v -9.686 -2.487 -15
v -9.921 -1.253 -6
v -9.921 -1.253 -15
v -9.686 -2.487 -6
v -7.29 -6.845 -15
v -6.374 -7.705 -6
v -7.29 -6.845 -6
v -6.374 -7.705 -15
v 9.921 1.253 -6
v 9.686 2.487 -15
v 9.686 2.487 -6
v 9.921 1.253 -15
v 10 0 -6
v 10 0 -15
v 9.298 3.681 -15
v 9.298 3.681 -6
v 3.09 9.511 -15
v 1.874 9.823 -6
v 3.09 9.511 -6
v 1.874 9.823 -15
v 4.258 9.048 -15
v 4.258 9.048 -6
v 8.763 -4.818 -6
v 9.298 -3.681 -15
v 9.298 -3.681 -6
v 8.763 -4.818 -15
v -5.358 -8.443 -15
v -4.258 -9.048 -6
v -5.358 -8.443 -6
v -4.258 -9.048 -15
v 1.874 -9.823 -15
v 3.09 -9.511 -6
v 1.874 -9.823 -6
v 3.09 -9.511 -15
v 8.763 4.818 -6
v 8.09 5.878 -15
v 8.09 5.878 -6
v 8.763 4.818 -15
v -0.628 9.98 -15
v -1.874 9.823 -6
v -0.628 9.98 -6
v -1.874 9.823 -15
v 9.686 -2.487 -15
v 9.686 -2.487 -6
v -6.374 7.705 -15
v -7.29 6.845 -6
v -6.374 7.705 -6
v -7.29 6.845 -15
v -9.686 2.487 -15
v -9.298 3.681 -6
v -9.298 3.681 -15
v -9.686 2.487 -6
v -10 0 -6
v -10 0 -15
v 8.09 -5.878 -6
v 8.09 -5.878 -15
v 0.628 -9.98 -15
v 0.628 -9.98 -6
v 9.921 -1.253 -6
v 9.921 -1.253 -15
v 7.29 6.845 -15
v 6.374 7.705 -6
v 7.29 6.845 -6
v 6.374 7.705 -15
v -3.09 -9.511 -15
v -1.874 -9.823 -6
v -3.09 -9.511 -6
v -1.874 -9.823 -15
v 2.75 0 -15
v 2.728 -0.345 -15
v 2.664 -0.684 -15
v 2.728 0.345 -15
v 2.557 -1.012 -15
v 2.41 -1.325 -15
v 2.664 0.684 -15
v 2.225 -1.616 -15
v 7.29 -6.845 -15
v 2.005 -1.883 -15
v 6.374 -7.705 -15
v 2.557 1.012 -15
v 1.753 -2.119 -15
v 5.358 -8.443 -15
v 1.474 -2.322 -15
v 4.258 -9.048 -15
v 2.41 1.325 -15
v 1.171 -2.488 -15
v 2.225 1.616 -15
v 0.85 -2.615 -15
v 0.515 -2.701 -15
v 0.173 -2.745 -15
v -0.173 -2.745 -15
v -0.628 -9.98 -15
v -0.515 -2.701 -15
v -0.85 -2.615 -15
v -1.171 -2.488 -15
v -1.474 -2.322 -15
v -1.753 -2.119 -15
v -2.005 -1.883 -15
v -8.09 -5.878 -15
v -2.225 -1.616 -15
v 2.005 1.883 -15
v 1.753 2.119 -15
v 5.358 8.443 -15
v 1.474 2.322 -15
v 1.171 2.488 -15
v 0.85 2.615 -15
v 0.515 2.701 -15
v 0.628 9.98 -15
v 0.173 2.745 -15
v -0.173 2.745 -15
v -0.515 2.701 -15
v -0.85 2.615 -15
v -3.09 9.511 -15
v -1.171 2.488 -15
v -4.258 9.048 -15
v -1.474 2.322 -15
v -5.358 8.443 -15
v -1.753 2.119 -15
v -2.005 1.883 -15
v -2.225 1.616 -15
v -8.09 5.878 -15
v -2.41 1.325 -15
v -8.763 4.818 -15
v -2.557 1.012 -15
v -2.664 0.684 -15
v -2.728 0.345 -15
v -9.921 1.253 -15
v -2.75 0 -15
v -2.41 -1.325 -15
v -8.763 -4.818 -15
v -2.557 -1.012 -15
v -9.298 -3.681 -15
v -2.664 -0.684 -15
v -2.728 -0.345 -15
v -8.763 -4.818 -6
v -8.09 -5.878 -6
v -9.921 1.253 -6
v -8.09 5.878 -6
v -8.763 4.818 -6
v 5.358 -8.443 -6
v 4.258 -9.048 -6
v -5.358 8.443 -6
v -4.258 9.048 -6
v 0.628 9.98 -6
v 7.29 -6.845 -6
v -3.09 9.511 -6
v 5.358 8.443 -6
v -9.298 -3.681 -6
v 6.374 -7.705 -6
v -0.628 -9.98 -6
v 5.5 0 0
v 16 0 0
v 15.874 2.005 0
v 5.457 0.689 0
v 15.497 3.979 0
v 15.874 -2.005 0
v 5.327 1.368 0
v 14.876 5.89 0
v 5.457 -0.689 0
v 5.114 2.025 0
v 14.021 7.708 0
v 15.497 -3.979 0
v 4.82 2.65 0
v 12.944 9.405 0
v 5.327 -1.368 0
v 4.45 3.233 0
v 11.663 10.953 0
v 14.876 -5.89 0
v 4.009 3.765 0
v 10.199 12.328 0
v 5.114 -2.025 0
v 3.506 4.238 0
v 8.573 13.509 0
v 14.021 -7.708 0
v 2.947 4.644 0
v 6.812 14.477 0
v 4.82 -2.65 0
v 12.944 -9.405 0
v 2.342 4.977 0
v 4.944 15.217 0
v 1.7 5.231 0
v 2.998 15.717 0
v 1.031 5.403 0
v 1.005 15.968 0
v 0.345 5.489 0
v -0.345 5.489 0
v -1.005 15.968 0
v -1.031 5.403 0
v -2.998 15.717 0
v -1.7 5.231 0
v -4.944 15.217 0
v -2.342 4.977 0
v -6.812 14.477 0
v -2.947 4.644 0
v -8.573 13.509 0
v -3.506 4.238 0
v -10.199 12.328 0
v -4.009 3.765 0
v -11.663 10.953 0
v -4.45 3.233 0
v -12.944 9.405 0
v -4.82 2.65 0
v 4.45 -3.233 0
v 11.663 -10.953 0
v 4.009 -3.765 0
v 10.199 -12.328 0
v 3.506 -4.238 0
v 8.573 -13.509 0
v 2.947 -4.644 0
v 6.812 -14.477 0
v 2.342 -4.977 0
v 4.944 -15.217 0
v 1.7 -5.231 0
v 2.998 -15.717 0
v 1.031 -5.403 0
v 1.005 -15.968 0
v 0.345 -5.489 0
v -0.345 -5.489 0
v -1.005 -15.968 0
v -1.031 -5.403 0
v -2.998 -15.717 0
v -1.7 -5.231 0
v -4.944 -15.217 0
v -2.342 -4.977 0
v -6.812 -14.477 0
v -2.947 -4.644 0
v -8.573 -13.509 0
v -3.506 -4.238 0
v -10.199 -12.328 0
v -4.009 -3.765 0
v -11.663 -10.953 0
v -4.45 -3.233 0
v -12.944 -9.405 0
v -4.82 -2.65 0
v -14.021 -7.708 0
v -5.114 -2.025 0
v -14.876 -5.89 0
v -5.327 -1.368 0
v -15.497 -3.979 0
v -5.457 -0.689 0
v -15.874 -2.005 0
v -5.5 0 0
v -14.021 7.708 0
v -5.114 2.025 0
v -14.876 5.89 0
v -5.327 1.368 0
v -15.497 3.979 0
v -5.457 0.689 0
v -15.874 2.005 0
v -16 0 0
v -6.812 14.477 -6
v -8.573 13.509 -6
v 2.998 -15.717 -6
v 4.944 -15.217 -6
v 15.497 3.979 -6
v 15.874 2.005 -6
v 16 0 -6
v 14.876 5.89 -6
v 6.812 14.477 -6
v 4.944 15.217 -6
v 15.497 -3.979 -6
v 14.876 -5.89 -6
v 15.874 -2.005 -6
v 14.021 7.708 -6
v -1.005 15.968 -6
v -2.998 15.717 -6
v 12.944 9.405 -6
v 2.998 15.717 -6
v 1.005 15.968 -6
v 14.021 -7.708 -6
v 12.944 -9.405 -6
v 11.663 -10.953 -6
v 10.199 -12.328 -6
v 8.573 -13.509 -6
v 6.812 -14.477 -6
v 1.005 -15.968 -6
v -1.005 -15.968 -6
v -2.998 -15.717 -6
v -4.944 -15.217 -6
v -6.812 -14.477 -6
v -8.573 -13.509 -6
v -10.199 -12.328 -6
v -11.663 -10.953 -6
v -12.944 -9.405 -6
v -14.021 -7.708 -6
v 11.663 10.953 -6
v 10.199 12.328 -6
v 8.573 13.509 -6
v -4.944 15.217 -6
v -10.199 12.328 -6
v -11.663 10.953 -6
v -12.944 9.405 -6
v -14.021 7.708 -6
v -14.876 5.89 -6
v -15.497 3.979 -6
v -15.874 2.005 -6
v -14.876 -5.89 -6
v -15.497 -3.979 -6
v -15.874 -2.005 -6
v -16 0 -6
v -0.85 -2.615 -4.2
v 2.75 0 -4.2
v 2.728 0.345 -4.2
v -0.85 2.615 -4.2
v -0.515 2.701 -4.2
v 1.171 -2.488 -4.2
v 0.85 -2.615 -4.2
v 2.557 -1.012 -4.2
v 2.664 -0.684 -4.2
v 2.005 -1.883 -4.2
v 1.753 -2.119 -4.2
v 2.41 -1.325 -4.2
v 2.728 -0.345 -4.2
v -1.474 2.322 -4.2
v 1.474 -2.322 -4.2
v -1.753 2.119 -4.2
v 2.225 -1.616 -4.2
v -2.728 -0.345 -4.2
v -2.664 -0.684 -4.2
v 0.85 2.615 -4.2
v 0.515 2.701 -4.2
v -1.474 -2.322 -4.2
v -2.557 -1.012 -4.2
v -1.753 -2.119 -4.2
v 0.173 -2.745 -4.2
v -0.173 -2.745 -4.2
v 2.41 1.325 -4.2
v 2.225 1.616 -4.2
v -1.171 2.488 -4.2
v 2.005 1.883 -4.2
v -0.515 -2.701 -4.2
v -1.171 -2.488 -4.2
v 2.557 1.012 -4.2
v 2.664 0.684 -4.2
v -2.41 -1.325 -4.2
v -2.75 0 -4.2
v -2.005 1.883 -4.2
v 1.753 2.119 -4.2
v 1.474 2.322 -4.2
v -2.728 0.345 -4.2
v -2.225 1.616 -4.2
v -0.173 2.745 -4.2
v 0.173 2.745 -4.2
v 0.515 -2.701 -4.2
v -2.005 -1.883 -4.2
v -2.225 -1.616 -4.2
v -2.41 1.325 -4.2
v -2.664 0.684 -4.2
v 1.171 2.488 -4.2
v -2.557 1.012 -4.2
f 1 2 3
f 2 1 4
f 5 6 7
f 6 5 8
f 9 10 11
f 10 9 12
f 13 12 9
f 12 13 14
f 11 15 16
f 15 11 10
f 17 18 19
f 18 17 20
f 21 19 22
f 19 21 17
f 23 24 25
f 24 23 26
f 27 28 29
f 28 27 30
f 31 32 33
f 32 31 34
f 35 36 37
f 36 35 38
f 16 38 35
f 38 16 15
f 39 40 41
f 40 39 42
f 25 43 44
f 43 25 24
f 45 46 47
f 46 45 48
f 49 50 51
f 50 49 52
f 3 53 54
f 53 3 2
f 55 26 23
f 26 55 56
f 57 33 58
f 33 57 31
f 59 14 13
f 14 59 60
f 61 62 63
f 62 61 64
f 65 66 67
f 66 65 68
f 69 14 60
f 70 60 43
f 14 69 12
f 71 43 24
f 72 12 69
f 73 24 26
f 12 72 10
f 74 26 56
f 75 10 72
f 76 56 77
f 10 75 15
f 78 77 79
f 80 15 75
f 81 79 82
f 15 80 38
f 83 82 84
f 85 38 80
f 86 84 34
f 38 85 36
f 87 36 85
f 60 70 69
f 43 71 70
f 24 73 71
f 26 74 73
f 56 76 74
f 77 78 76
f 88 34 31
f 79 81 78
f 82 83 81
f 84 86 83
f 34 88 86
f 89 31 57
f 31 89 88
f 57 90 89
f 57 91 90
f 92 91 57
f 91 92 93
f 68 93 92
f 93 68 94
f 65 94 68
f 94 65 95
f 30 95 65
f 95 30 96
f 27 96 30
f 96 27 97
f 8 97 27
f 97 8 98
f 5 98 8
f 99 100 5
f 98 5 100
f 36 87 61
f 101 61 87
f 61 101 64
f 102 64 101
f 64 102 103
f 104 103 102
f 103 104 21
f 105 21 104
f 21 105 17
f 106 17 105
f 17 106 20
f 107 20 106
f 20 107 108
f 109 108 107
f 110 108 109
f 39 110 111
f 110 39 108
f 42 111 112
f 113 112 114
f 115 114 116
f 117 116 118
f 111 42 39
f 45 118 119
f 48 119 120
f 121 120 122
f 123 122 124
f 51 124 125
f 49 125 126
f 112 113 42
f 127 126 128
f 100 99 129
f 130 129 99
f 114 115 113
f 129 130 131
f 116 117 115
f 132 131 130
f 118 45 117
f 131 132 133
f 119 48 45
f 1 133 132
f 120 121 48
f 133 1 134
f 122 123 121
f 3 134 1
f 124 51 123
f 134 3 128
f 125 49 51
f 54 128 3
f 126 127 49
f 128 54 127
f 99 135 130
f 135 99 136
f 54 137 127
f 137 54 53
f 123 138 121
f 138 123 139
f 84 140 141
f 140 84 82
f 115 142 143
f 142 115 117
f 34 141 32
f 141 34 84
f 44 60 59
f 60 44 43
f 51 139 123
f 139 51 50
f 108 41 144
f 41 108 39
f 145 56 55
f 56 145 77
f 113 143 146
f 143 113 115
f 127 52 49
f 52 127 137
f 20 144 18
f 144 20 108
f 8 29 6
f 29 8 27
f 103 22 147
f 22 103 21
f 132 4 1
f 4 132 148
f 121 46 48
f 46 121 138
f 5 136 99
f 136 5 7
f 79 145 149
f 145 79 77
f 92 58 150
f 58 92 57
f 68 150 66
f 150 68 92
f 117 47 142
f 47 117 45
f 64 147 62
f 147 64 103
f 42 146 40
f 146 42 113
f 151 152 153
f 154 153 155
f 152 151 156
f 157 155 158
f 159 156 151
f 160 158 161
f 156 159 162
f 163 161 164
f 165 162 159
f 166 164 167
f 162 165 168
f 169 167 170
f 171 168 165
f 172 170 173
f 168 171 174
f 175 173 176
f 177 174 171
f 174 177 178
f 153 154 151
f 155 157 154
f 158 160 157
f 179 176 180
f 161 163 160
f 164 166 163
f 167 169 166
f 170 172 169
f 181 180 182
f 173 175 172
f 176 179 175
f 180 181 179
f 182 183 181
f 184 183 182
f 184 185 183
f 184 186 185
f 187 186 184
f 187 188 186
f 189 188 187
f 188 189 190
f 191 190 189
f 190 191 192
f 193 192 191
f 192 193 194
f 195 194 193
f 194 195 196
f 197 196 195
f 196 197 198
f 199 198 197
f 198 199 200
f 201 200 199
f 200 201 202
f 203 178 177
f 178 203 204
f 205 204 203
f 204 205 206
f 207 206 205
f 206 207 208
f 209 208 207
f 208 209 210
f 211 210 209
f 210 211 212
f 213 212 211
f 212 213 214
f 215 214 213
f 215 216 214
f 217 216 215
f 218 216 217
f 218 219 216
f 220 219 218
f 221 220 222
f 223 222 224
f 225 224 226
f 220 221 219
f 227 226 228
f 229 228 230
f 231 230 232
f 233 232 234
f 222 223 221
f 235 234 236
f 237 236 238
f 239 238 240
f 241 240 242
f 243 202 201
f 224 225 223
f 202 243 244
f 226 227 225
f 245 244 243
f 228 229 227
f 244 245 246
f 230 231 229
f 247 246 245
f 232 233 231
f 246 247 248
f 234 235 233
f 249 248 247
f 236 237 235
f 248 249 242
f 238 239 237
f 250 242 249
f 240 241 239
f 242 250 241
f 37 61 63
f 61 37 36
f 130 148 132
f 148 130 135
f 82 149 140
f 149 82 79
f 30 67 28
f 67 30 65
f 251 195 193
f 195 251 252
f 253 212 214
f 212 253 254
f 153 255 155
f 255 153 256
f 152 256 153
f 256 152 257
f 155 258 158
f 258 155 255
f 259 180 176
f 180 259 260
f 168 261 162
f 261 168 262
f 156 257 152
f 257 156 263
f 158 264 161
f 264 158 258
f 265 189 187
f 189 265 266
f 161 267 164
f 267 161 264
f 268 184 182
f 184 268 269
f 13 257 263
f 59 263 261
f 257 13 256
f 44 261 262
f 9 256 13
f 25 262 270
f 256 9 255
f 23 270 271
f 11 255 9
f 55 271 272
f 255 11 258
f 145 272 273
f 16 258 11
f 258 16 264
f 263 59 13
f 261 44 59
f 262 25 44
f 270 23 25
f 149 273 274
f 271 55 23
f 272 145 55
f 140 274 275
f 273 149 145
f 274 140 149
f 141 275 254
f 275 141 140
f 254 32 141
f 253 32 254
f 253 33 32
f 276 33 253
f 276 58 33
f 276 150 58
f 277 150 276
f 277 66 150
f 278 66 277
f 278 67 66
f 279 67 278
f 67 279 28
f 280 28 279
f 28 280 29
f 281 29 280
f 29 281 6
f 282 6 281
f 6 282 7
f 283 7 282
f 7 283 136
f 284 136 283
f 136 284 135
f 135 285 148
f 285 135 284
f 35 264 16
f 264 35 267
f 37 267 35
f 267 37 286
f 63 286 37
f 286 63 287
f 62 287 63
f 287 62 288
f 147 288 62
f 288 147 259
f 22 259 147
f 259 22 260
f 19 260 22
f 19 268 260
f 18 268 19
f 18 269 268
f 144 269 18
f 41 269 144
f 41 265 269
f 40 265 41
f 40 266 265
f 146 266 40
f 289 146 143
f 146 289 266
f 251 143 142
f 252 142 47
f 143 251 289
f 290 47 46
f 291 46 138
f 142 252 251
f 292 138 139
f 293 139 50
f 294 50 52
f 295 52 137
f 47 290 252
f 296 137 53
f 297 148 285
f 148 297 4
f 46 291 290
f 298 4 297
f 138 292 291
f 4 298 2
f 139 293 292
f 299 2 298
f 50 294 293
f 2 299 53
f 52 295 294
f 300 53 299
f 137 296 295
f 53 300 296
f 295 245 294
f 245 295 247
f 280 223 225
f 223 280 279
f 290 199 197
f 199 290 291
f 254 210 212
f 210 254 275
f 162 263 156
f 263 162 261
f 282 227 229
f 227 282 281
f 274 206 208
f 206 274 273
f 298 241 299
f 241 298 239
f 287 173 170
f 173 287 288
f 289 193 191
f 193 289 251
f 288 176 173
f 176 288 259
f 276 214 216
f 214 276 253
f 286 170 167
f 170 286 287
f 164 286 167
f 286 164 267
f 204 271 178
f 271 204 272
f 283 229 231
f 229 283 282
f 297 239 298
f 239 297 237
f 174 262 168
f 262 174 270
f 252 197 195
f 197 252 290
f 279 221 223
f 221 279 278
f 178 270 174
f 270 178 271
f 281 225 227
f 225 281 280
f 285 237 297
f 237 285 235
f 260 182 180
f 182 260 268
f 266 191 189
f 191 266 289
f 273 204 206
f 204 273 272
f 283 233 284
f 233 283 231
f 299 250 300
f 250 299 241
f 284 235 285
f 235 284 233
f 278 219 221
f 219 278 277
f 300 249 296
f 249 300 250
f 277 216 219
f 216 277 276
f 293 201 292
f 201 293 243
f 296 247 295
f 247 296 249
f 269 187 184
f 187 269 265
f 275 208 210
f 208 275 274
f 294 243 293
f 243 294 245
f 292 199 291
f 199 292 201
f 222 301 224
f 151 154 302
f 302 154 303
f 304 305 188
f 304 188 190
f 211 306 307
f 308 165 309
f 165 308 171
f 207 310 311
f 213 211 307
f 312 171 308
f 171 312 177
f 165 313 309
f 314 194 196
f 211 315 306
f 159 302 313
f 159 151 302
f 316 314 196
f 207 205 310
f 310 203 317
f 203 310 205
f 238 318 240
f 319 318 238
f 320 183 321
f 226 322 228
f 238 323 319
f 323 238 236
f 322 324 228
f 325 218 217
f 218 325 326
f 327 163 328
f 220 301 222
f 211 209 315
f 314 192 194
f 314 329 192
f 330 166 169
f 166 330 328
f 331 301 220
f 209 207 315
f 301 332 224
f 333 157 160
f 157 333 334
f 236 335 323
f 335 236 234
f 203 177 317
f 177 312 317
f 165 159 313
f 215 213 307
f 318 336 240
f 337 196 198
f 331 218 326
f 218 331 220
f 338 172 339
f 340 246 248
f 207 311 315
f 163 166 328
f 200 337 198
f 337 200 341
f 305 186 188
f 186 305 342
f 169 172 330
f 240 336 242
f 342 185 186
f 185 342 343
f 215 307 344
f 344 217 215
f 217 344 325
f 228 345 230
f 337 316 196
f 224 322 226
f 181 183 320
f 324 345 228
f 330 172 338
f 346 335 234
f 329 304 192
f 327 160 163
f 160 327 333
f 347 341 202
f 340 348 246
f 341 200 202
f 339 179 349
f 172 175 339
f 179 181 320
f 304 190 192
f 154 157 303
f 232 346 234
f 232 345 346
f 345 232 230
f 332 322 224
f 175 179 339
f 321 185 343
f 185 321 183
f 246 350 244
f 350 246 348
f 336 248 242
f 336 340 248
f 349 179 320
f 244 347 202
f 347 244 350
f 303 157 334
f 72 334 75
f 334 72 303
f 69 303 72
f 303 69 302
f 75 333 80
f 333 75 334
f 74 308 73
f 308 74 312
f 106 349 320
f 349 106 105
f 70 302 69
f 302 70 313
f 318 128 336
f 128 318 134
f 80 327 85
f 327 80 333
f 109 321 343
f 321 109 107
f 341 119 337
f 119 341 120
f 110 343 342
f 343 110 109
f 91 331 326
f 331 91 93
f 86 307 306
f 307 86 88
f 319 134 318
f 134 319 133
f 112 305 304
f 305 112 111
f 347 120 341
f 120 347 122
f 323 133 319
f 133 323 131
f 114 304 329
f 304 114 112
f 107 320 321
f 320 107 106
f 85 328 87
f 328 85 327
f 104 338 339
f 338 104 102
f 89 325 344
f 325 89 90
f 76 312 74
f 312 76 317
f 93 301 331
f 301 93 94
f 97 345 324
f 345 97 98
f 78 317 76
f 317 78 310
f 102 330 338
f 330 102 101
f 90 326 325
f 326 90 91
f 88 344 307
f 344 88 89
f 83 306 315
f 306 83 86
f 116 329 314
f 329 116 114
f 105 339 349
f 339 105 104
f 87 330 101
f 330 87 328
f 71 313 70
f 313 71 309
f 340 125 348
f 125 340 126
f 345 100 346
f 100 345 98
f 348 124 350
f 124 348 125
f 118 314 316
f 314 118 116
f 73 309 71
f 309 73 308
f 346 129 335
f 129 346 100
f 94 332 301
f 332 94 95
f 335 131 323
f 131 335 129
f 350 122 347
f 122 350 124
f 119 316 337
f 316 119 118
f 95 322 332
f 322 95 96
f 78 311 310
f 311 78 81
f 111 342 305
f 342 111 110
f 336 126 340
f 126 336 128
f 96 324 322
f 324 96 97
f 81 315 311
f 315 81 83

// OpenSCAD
$fn = 50;


difference() {
	union() {
		translate(v = [0, 0, -15.0000000000]) {
			cylinder(h = 15, r = 10.0000000000);
		}
		translate(v = [0, 0, -6.0000000000]) {
			cylinder(h = 6, r = 16.0000000000);
		}
	}
	union() {
		translate(v = [0, 0, 0]) {
			rotate(a = [0, 0, 0]) {
				difference() {
					union() {
						#translate(v = [0, 0, -15.0000000000]) {
							cylinder(h = 15, r = 2.2500000000);
						}
						#translate(v = [0, 0, -4.2000000000]) {
							cylinder(h = 4.2000000000, r = 10.0000000000, r1 = 2.7500000000, r2 = 5.5000000000);
						}
						#translate(v = [0, 0, -15.0000000000]) {
							cylinder(h = 15, r = 2.7500000000);
						}
						#translate(v = [0, 0, -15.0000000000]) {
							cylinder(h = 15, r = 2.2500000000);
						}
					}
					union();
				}
			}
		}
	}
}
